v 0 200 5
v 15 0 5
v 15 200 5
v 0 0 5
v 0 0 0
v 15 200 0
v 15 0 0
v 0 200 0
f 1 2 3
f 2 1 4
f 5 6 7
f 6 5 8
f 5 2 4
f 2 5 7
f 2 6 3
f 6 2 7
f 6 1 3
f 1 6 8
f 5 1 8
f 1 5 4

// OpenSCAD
//Führungsschiene für die Kreissäge von Bosch
//Idee: Schiene die in Nut der Kreissäge passt mit versenkten Bohrlöchern
//ev. Möglichkeit um mehrere Schienen exakt aneinander auszurichten
cube([15,200,5]); //50 for testing, make it longer when in use
